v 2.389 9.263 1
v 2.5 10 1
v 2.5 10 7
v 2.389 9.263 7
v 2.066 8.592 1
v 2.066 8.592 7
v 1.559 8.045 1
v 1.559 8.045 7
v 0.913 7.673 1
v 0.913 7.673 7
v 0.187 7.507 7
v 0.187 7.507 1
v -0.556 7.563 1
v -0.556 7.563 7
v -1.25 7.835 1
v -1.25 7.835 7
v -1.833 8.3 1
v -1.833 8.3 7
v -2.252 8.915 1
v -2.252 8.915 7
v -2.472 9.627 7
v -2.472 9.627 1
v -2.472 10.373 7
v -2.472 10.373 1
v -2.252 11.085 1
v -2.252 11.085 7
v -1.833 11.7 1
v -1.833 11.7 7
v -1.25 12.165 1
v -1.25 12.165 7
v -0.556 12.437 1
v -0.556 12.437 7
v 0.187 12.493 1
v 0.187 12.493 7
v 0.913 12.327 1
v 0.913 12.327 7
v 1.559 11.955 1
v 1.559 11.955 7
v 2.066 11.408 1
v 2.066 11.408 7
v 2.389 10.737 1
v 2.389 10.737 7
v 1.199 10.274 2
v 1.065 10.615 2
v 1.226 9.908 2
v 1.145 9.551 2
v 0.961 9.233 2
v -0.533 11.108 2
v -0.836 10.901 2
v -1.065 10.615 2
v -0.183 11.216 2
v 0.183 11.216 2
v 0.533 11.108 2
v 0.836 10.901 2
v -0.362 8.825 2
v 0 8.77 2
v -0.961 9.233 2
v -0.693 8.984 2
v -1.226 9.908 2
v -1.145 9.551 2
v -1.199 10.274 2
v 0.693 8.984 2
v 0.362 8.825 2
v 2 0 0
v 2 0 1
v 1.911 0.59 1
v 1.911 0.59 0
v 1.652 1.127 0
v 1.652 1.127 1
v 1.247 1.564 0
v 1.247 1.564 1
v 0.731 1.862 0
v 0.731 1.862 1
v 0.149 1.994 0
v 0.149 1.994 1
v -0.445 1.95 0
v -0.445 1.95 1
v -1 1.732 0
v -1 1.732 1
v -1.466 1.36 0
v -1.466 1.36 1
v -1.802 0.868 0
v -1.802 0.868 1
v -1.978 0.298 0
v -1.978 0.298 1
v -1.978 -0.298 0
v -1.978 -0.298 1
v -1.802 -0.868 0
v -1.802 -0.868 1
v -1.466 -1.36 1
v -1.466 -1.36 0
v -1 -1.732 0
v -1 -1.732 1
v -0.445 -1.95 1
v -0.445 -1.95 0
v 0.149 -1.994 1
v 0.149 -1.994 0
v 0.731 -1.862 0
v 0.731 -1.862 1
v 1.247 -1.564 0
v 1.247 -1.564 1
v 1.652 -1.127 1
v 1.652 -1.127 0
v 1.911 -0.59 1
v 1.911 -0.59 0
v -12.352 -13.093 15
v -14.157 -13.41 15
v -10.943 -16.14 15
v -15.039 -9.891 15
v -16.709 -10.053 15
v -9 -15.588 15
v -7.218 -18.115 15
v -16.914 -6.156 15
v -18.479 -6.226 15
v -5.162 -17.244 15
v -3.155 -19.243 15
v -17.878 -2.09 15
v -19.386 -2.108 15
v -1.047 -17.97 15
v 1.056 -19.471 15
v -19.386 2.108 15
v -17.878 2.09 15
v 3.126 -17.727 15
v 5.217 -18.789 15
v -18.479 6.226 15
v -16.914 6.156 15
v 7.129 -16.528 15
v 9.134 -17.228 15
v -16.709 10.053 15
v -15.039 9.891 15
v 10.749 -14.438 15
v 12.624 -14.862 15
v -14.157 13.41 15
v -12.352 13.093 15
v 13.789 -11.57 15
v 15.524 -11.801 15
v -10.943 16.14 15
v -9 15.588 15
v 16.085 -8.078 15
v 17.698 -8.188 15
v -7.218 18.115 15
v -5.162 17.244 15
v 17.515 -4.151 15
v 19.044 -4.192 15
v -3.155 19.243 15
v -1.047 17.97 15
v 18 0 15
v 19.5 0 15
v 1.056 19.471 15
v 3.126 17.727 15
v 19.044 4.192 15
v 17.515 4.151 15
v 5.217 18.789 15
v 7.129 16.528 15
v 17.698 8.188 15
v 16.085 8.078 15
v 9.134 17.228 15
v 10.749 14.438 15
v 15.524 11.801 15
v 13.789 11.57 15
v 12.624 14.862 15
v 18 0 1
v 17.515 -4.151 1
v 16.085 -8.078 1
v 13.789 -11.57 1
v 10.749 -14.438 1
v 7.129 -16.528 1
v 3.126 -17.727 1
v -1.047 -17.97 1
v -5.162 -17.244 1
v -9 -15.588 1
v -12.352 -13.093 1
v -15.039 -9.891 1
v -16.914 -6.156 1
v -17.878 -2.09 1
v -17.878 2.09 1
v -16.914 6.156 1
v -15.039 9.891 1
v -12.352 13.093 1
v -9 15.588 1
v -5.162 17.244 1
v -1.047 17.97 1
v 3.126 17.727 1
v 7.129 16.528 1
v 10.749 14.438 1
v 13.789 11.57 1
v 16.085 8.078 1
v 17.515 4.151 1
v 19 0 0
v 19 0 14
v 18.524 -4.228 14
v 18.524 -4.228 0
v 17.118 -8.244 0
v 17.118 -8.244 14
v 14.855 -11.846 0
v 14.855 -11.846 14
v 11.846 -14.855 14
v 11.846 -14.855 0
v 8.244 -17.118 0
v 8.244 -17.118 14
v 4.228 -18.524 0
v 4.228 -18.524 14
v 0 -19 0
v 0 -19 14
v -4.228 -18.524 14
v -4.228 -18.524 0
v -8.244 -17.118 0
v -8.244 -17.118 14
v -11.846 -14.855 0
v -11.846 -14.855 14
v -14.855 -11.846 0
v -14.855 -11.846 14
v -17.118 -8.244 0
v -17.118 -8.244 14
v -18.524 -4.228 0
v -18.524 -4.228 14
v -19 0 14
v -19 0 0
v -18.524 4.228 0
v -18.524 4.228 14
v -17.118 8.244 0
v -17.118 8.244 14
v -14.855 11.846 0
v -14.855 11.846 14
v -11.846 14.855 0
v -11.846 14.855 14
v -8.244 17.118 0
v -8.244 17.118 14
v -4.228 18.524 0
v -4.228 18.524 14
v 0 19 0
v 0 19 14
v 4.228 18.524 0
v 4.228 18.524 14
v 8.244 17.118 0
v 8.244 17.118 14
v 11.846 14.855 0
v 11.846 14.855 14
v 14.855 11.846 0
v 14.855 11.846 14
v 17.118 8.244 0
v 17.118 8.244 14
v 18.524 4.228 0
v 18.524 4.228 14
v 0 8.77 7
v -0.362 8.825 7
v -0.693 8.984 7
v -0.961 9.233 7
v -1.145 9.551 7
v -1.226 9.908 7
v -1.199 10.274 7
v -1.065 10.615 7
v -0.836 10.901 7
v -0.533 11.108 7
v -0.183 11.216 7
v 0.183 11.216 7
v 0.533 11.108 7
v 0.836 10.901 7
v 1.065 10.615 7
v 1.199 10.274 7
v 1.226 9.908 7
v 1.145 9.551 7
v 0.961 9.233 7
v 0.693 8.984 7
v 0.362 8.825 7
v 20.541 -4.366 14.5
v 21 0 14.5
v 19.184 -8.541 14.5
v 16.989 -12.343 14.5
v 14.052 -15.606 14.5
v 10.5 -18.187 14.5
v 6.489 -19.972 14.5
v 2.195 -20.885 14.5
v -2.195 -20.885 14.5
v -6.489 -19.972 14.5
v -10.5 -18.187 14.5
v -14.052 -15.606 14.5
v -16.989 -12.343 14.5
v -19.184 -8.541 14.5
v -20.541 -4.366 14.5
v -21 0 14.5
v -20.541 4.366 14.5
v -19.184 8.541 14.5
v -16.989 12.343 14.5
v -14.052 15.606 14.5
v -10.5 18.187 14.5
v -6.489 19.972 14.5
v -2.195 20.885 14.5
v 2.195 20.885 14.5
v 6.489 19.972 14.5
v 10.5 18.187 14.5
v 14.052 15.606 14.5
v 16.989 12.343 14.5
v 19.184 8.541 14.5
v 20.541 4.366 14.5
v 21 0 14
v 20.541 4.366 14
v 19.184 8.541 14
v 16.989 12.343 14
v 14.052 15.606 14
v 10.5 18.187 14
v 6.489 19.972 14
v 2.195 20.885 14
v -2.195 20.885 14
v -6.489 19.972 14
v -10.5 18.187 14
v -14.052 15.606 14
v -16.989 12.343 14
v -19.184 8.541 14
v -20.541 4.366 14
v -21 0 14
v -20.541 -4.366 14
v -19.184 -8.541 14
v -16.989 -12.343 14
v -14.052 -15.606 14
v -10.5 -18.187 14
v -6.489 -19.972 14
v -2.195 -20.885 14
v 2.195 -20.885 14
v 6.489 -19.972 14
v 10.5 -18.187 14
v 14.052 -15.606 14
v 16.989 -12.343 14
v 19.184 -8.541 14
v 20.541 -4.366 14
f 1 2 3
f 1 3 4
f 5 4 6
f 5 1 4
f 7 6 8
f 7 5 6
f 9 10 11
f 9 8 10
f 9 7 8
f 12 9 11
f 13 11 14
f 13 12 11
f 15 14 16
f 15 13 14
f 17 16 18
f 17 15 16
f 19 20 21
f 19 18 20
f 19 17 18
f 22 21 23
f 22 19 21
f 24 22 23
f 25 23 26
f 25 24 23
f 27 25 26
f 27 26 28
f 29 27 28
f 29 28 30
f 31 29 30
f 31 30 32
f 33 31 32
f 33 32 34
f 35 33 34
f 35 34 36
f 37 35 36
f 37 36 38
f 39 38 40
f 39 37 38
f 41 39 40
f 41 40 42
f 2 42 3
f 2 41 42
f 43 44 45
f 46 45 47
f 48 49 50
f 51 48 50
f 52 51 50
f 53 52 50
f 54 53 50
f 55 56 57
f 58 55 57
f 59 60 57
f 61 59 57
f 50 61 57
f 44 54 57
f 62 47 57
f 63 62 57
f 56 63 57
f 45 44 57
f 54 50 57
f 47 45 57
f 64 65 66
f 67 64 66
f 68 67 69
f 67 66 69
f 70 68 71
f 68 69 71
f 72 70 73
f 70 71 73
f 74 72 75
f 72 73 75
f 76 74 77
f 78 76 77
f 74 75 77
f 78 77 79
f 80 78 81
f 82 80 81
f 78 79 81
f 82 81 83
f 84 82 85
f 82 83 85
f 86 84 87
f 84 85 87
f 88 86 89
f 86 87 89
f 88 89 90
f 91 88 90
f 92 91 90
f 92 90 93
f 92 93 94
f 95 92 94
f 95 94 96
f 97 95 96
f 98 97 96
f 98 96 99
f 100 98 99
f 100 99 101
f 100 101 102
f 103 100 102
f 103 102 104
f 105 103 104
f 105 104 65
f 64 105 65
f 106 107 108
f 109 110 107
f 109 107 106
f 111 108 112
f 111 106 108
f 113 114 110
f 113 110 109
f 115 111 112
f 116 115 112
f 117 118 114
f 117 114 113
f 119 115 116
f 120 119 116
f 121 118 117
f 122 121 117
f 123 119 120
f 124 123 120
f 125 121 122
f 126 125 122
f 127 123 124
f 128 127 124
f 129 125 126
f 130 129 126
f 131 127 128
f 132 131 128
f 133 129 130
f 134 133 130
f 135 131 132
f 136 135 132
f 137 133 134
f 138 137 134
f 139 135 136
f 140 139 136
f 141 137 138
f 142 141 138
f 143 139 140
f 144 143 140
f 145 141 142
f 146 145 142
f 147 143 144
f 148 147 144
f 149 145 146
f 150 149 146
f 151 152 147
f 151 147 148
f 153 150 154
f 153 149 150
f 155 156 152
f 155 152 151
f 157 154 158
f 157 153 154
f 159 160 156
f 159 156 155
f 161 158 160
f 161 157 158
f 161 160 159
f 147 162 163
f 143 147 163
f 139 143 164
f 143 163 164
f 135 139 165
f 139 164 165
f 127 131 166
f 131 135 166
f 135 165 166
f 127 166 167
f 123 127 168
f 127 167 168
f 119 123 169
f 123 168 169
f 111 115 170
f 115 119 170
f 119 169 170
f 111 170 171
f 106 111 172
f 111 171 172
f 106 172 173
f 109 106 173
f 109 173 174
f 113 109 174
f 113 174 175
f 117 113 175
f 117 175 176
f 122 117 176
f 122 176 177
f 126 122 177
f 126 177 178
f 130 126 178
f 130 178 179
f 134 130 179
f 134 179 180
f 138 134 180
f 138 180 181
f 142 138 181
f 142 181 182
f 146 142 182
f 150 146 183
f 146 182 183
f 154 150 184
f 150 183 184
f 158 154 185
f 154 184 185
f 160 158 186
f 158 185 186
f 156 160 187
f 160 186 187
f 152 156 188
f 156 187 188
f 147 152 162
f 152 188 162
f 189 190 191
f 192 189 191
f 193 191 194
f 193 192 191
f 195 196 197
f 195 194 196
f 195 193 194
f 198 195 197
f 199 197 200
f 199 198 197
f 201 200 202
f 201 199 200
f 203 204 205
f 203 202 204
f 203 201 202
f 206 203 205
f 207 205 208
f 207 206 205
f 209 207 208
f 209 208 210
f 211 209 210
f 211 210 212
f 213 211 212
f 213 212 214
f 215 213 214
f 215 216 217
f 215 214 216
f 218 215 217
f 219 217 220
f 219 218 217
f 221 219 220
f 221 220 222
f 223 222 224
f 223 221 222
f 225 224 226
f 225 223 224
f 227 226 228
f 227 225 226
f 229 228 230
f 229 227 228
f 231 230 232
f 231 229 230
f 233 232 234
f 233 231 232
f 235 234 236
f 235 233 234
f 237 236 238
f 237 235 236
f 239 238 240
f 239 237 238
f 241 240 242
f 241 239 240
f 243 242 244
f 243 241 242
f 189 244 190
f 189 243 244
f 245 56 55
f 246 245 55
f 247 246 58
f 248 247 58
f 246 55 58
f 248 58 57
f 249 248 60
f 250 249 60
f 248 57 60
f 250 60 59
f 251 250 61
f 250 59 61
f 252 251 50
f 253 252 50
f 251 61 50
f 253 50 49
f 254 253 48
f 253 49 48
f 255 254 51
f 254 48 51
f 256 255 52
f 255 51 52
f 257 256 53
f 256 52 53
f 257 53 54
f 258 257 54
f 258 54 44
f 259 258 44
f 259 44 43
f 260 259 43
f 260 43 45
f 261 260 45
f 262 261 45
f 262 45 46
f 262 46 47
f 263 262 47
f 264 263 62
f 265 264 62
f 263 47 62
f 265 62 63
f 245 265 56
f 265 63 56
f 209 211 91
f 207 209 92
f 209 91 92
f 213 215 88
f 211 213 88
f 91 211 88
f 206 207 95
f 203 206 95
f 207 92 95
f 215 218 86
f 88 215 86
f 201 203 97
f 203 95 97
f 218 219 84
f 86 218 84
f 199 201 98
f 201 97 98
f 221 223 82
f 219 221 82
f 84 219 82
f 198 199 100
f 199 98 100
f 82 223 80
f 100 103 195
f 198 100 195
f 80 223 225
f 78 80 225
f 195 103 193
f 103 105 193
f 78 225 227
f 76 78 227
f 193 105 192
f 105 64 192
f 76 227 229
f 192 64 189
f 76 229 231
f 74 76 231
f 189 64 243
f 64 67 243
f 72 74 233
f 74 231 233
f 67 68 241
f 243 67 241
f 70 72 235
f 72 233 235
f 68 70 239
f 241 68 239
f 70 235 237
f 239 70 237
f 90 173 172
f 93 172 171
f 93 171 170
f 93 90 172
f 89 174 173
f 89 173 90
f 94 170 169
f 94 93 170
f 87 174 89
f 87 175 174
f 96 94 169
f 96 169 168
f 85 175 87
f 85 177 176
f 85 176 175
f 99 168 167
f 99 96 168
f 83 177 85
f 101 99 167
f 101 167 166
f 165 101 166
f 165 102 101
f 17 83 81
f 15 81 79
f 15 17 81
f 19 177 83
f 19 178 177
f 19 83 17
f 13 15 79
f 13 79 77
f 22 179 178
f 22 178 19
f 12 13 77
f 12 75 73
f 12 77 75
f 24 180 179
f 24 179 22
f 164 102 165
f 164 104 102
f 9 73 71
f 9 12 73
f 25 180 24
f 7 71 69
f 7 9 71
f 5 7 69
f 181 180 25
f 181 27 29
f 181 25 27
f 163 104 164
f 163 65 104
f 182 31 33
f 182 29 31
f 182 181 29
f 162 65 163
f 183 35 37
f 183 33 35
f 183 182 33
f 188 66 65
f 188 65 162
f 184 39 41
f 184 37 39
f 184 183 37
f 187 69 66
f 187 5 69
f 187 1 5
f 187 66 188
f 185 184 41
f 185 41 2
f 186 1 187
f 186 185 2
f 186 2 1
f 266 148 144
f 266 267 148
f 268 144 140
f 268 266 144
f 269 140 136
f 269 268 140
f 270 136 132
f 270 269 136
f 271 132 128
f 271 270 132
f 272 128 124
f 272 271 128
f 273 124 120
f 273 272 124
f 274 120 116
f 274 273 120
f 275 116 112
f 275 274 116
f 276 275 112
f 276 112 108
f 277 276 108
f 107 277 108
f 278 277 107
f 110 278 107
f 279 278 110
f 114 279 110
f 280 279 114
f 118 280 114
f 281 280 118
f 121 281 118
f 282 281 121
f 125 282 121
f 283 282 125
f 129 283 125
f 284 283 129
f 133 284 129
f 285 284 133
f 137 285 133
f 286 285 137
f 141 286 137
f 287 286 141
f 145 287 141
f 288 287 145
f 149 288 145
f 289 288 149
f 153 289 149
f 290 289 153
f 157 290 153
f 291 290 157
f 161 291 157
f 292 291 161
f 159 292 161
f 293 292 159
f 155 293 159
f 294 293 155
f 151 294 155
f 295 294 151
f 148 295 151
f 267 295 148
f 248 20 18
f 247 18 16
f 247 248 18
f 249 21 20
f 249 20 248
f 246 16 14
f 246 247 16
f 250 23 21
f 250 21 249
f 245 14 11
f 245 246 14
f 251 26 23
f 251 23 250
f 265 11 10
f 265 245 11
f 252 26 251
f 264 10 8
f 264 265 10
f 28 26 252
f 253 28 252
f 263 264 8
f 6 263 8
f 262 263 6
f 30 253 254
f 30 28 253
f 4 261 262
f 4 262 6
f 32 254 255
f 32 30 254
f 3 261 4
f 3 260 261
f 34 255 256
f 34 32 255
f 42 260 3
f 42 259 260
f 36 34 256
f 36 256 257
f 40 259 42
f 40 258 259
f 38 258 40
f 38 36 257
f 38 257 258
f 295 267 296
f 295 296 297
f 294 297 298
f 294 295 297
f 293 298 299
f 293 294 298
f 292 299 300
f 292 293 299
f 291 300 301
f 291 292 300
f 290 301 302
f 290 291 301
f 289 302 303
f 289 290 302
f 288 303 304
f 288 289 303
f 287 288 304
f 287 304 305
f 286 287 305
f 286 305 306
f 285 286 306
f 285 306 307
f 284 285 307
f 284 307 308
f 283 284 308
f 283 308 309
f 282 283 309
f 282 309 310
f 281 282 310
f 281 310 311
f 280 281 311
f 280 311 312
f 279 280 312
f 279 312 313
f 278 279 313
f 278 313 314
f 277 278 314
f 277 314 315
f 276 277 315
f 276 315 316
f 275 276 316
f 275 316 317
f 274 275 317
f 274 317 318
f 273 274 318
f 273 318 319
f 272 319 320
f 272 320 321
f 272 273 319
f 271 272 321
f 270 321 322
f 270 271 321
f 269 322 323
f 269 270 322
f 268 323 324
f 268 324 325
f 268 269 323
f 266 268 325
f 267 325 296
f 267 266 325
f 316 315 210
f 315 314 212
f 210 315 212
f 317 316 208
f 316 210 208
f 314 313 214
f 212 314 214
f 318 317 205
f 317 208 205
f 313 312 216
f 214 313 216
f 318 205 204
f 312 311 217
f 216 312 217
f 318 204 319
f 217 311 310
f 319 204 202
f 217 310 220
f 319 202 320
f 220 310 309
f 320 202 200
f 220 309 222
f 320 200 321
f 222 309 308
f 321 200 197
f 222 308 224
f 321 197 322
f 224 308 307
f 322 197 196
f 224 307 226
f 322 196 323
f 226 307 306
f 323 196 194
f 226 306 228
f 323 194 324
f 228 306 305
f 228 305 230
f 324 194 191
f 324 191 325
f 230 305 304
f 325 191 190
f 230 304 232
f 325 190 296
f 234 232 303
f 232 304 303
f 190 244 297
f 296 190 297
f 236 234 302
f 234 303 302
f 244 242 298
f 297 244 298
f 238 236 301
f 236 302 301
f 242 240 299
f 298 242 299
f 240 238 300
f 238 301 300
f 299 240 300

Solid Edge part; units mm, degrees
sketch "Sketch1" plane through (0, 0, 0) normal (0, 0, 1) x (1, 0, 0)
  circle A0 centre (0, 0) radius 19
extrude "Protrusion1" add sketch "Sketch1" along normal blind 1
sketch "Sketch2" plane through (0, 0, 1) normal (0, 0, 1) x (1, 0, 0)
  circle A0 centre (0, 0) radius 19
  circle A1 centre (0, 0) radius 18
extrude "Walls" add sketch "Sketch2" along normal blind 14
sketch "Sketch3" plane through (0, 0, 15) normal (0, 0, 1) x (1, 0, 0)
  circle A0 centre (0, 0) radius 19
  circle A1 centre (0, 0) radius 21
extrude "Top" add sketch "Sketch3" against normal blind 1
sketch "Sketch4" plane through (0, 0, 1) normal (0, 0, 1) x (1, 0, 0)
  circle A0 centre (0, 0) radius 2
extrude "Cutout1" cut sketch "Sketch4" against normal through all
sketch "Sketch5" plane through (0, 0, 1) normal (0, 0, 1) x (1, 0, 0)
  circle A0 centre (0, 10) radius 2.5
  dimension "D1" = 10
extrude "Lock" add sketch "Sketch5" along normal blind 6
hole "Hole___Lock" at (0, 10, 7) direction (0, 0, -1) diameter 2.459 depth 5
chamfer "Chamfer___Top" distance 1.5 distance2 0.5 1 edges at (-21, 0, 15) measured on face at (-14.42, -13.58, 15)
properties material "ABS Plastic, high impact"
